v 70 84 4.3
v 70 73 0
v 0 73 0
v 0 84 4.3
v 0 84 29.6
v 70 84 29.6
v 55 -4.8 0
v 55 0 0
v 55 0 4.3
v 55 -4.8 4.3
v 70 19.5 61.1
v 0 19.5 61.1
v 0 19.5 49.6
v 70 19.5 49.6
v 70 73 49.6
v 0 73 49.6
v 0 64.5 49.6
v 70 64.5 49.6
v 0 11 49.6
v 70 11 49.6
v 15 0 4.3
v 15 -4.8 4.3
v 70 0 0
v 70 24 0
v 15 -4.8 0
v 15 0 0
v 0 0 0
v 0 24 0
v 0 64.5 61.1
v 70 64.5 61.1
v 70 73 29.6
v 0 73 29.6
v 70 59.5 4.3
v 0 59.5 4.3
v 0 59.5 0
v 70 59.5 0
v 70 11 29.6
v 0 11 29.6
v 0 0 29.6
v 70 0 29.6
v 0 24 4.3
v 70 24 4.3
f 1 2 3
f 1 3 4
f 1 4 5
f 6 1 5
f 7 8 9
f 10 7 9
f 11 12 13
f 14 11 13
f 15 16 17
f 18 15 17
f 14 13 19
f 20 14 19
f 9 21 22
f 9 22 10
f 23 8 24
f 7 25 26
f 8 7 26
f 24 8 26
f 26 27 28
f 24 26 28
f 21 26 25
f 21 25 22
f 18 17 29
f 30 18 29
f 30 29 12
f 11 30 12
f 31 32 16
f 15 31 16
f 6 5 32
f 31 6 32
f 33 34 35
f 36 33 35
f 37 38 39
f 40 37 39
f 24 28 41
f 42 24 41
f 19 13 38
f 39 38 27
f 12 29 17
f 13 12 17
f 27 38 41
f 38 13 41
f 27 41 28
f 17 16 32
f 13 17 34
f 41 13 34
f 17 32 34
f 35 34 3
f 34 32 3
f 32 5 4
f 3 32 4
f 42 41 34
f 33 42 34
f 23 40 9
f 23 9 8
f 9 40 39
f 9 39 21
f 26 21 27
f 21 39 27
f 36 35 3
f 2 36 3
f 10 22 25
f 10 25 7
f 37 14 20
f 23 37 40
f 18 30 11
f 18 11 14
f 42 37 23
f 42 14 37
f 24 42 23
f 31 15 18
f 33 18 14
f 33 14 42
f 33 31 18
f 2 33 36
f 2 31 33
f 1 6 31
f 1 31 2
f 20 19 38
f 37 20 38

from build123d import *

# Parameters (mm, degrees)
ESTRUSIONE_ESTRUSIONE1_DEPTH = 70
SCHIZZO2_W                   = 40
SCHIZZO2_H                   = 4.3
ESTRUSIONE_ESTRUSIONE2_DEPTH = 4.8


with BuildPart() as part:
    # Schizzo1 → Estrusione-Estrusione1 (new body)
    with BuildSketch(Plane(origin=(0, 0, 0), x_dir=(0, 0, -1), z_dir=(1, 0, 0))):
        Polygon((-61.1, 64.5), (-61.1, 19.5), (-49.6, 19.5), (-49.6, 11), (-29.6, 11), (-29.6, 0), (0, 0), (0, 24), (-4.3, 24), (-4.3, 59.5), (0, 59.5), (0, 73), (-4.3, 84), (-29.6, 84), (-29.6, 73), (-49.6, 73), (-49.6, 64.5), align=None)
    extrude(amount=ESTRUSIONE_ESTRUSIONE1_DEPTH)

    # Schizzo2 → Estrusione-Estrusione2 (add)
    with BuildSketch(Plane.XZ):
        with Locations((35, 2.15)):
            Rectangle(SCHIZZO2_W, SCHIZZO2_H)
    extrude(amount=ESTRUSIONE_ESTRUSIONE2_DEPTH)


solid = part.part
